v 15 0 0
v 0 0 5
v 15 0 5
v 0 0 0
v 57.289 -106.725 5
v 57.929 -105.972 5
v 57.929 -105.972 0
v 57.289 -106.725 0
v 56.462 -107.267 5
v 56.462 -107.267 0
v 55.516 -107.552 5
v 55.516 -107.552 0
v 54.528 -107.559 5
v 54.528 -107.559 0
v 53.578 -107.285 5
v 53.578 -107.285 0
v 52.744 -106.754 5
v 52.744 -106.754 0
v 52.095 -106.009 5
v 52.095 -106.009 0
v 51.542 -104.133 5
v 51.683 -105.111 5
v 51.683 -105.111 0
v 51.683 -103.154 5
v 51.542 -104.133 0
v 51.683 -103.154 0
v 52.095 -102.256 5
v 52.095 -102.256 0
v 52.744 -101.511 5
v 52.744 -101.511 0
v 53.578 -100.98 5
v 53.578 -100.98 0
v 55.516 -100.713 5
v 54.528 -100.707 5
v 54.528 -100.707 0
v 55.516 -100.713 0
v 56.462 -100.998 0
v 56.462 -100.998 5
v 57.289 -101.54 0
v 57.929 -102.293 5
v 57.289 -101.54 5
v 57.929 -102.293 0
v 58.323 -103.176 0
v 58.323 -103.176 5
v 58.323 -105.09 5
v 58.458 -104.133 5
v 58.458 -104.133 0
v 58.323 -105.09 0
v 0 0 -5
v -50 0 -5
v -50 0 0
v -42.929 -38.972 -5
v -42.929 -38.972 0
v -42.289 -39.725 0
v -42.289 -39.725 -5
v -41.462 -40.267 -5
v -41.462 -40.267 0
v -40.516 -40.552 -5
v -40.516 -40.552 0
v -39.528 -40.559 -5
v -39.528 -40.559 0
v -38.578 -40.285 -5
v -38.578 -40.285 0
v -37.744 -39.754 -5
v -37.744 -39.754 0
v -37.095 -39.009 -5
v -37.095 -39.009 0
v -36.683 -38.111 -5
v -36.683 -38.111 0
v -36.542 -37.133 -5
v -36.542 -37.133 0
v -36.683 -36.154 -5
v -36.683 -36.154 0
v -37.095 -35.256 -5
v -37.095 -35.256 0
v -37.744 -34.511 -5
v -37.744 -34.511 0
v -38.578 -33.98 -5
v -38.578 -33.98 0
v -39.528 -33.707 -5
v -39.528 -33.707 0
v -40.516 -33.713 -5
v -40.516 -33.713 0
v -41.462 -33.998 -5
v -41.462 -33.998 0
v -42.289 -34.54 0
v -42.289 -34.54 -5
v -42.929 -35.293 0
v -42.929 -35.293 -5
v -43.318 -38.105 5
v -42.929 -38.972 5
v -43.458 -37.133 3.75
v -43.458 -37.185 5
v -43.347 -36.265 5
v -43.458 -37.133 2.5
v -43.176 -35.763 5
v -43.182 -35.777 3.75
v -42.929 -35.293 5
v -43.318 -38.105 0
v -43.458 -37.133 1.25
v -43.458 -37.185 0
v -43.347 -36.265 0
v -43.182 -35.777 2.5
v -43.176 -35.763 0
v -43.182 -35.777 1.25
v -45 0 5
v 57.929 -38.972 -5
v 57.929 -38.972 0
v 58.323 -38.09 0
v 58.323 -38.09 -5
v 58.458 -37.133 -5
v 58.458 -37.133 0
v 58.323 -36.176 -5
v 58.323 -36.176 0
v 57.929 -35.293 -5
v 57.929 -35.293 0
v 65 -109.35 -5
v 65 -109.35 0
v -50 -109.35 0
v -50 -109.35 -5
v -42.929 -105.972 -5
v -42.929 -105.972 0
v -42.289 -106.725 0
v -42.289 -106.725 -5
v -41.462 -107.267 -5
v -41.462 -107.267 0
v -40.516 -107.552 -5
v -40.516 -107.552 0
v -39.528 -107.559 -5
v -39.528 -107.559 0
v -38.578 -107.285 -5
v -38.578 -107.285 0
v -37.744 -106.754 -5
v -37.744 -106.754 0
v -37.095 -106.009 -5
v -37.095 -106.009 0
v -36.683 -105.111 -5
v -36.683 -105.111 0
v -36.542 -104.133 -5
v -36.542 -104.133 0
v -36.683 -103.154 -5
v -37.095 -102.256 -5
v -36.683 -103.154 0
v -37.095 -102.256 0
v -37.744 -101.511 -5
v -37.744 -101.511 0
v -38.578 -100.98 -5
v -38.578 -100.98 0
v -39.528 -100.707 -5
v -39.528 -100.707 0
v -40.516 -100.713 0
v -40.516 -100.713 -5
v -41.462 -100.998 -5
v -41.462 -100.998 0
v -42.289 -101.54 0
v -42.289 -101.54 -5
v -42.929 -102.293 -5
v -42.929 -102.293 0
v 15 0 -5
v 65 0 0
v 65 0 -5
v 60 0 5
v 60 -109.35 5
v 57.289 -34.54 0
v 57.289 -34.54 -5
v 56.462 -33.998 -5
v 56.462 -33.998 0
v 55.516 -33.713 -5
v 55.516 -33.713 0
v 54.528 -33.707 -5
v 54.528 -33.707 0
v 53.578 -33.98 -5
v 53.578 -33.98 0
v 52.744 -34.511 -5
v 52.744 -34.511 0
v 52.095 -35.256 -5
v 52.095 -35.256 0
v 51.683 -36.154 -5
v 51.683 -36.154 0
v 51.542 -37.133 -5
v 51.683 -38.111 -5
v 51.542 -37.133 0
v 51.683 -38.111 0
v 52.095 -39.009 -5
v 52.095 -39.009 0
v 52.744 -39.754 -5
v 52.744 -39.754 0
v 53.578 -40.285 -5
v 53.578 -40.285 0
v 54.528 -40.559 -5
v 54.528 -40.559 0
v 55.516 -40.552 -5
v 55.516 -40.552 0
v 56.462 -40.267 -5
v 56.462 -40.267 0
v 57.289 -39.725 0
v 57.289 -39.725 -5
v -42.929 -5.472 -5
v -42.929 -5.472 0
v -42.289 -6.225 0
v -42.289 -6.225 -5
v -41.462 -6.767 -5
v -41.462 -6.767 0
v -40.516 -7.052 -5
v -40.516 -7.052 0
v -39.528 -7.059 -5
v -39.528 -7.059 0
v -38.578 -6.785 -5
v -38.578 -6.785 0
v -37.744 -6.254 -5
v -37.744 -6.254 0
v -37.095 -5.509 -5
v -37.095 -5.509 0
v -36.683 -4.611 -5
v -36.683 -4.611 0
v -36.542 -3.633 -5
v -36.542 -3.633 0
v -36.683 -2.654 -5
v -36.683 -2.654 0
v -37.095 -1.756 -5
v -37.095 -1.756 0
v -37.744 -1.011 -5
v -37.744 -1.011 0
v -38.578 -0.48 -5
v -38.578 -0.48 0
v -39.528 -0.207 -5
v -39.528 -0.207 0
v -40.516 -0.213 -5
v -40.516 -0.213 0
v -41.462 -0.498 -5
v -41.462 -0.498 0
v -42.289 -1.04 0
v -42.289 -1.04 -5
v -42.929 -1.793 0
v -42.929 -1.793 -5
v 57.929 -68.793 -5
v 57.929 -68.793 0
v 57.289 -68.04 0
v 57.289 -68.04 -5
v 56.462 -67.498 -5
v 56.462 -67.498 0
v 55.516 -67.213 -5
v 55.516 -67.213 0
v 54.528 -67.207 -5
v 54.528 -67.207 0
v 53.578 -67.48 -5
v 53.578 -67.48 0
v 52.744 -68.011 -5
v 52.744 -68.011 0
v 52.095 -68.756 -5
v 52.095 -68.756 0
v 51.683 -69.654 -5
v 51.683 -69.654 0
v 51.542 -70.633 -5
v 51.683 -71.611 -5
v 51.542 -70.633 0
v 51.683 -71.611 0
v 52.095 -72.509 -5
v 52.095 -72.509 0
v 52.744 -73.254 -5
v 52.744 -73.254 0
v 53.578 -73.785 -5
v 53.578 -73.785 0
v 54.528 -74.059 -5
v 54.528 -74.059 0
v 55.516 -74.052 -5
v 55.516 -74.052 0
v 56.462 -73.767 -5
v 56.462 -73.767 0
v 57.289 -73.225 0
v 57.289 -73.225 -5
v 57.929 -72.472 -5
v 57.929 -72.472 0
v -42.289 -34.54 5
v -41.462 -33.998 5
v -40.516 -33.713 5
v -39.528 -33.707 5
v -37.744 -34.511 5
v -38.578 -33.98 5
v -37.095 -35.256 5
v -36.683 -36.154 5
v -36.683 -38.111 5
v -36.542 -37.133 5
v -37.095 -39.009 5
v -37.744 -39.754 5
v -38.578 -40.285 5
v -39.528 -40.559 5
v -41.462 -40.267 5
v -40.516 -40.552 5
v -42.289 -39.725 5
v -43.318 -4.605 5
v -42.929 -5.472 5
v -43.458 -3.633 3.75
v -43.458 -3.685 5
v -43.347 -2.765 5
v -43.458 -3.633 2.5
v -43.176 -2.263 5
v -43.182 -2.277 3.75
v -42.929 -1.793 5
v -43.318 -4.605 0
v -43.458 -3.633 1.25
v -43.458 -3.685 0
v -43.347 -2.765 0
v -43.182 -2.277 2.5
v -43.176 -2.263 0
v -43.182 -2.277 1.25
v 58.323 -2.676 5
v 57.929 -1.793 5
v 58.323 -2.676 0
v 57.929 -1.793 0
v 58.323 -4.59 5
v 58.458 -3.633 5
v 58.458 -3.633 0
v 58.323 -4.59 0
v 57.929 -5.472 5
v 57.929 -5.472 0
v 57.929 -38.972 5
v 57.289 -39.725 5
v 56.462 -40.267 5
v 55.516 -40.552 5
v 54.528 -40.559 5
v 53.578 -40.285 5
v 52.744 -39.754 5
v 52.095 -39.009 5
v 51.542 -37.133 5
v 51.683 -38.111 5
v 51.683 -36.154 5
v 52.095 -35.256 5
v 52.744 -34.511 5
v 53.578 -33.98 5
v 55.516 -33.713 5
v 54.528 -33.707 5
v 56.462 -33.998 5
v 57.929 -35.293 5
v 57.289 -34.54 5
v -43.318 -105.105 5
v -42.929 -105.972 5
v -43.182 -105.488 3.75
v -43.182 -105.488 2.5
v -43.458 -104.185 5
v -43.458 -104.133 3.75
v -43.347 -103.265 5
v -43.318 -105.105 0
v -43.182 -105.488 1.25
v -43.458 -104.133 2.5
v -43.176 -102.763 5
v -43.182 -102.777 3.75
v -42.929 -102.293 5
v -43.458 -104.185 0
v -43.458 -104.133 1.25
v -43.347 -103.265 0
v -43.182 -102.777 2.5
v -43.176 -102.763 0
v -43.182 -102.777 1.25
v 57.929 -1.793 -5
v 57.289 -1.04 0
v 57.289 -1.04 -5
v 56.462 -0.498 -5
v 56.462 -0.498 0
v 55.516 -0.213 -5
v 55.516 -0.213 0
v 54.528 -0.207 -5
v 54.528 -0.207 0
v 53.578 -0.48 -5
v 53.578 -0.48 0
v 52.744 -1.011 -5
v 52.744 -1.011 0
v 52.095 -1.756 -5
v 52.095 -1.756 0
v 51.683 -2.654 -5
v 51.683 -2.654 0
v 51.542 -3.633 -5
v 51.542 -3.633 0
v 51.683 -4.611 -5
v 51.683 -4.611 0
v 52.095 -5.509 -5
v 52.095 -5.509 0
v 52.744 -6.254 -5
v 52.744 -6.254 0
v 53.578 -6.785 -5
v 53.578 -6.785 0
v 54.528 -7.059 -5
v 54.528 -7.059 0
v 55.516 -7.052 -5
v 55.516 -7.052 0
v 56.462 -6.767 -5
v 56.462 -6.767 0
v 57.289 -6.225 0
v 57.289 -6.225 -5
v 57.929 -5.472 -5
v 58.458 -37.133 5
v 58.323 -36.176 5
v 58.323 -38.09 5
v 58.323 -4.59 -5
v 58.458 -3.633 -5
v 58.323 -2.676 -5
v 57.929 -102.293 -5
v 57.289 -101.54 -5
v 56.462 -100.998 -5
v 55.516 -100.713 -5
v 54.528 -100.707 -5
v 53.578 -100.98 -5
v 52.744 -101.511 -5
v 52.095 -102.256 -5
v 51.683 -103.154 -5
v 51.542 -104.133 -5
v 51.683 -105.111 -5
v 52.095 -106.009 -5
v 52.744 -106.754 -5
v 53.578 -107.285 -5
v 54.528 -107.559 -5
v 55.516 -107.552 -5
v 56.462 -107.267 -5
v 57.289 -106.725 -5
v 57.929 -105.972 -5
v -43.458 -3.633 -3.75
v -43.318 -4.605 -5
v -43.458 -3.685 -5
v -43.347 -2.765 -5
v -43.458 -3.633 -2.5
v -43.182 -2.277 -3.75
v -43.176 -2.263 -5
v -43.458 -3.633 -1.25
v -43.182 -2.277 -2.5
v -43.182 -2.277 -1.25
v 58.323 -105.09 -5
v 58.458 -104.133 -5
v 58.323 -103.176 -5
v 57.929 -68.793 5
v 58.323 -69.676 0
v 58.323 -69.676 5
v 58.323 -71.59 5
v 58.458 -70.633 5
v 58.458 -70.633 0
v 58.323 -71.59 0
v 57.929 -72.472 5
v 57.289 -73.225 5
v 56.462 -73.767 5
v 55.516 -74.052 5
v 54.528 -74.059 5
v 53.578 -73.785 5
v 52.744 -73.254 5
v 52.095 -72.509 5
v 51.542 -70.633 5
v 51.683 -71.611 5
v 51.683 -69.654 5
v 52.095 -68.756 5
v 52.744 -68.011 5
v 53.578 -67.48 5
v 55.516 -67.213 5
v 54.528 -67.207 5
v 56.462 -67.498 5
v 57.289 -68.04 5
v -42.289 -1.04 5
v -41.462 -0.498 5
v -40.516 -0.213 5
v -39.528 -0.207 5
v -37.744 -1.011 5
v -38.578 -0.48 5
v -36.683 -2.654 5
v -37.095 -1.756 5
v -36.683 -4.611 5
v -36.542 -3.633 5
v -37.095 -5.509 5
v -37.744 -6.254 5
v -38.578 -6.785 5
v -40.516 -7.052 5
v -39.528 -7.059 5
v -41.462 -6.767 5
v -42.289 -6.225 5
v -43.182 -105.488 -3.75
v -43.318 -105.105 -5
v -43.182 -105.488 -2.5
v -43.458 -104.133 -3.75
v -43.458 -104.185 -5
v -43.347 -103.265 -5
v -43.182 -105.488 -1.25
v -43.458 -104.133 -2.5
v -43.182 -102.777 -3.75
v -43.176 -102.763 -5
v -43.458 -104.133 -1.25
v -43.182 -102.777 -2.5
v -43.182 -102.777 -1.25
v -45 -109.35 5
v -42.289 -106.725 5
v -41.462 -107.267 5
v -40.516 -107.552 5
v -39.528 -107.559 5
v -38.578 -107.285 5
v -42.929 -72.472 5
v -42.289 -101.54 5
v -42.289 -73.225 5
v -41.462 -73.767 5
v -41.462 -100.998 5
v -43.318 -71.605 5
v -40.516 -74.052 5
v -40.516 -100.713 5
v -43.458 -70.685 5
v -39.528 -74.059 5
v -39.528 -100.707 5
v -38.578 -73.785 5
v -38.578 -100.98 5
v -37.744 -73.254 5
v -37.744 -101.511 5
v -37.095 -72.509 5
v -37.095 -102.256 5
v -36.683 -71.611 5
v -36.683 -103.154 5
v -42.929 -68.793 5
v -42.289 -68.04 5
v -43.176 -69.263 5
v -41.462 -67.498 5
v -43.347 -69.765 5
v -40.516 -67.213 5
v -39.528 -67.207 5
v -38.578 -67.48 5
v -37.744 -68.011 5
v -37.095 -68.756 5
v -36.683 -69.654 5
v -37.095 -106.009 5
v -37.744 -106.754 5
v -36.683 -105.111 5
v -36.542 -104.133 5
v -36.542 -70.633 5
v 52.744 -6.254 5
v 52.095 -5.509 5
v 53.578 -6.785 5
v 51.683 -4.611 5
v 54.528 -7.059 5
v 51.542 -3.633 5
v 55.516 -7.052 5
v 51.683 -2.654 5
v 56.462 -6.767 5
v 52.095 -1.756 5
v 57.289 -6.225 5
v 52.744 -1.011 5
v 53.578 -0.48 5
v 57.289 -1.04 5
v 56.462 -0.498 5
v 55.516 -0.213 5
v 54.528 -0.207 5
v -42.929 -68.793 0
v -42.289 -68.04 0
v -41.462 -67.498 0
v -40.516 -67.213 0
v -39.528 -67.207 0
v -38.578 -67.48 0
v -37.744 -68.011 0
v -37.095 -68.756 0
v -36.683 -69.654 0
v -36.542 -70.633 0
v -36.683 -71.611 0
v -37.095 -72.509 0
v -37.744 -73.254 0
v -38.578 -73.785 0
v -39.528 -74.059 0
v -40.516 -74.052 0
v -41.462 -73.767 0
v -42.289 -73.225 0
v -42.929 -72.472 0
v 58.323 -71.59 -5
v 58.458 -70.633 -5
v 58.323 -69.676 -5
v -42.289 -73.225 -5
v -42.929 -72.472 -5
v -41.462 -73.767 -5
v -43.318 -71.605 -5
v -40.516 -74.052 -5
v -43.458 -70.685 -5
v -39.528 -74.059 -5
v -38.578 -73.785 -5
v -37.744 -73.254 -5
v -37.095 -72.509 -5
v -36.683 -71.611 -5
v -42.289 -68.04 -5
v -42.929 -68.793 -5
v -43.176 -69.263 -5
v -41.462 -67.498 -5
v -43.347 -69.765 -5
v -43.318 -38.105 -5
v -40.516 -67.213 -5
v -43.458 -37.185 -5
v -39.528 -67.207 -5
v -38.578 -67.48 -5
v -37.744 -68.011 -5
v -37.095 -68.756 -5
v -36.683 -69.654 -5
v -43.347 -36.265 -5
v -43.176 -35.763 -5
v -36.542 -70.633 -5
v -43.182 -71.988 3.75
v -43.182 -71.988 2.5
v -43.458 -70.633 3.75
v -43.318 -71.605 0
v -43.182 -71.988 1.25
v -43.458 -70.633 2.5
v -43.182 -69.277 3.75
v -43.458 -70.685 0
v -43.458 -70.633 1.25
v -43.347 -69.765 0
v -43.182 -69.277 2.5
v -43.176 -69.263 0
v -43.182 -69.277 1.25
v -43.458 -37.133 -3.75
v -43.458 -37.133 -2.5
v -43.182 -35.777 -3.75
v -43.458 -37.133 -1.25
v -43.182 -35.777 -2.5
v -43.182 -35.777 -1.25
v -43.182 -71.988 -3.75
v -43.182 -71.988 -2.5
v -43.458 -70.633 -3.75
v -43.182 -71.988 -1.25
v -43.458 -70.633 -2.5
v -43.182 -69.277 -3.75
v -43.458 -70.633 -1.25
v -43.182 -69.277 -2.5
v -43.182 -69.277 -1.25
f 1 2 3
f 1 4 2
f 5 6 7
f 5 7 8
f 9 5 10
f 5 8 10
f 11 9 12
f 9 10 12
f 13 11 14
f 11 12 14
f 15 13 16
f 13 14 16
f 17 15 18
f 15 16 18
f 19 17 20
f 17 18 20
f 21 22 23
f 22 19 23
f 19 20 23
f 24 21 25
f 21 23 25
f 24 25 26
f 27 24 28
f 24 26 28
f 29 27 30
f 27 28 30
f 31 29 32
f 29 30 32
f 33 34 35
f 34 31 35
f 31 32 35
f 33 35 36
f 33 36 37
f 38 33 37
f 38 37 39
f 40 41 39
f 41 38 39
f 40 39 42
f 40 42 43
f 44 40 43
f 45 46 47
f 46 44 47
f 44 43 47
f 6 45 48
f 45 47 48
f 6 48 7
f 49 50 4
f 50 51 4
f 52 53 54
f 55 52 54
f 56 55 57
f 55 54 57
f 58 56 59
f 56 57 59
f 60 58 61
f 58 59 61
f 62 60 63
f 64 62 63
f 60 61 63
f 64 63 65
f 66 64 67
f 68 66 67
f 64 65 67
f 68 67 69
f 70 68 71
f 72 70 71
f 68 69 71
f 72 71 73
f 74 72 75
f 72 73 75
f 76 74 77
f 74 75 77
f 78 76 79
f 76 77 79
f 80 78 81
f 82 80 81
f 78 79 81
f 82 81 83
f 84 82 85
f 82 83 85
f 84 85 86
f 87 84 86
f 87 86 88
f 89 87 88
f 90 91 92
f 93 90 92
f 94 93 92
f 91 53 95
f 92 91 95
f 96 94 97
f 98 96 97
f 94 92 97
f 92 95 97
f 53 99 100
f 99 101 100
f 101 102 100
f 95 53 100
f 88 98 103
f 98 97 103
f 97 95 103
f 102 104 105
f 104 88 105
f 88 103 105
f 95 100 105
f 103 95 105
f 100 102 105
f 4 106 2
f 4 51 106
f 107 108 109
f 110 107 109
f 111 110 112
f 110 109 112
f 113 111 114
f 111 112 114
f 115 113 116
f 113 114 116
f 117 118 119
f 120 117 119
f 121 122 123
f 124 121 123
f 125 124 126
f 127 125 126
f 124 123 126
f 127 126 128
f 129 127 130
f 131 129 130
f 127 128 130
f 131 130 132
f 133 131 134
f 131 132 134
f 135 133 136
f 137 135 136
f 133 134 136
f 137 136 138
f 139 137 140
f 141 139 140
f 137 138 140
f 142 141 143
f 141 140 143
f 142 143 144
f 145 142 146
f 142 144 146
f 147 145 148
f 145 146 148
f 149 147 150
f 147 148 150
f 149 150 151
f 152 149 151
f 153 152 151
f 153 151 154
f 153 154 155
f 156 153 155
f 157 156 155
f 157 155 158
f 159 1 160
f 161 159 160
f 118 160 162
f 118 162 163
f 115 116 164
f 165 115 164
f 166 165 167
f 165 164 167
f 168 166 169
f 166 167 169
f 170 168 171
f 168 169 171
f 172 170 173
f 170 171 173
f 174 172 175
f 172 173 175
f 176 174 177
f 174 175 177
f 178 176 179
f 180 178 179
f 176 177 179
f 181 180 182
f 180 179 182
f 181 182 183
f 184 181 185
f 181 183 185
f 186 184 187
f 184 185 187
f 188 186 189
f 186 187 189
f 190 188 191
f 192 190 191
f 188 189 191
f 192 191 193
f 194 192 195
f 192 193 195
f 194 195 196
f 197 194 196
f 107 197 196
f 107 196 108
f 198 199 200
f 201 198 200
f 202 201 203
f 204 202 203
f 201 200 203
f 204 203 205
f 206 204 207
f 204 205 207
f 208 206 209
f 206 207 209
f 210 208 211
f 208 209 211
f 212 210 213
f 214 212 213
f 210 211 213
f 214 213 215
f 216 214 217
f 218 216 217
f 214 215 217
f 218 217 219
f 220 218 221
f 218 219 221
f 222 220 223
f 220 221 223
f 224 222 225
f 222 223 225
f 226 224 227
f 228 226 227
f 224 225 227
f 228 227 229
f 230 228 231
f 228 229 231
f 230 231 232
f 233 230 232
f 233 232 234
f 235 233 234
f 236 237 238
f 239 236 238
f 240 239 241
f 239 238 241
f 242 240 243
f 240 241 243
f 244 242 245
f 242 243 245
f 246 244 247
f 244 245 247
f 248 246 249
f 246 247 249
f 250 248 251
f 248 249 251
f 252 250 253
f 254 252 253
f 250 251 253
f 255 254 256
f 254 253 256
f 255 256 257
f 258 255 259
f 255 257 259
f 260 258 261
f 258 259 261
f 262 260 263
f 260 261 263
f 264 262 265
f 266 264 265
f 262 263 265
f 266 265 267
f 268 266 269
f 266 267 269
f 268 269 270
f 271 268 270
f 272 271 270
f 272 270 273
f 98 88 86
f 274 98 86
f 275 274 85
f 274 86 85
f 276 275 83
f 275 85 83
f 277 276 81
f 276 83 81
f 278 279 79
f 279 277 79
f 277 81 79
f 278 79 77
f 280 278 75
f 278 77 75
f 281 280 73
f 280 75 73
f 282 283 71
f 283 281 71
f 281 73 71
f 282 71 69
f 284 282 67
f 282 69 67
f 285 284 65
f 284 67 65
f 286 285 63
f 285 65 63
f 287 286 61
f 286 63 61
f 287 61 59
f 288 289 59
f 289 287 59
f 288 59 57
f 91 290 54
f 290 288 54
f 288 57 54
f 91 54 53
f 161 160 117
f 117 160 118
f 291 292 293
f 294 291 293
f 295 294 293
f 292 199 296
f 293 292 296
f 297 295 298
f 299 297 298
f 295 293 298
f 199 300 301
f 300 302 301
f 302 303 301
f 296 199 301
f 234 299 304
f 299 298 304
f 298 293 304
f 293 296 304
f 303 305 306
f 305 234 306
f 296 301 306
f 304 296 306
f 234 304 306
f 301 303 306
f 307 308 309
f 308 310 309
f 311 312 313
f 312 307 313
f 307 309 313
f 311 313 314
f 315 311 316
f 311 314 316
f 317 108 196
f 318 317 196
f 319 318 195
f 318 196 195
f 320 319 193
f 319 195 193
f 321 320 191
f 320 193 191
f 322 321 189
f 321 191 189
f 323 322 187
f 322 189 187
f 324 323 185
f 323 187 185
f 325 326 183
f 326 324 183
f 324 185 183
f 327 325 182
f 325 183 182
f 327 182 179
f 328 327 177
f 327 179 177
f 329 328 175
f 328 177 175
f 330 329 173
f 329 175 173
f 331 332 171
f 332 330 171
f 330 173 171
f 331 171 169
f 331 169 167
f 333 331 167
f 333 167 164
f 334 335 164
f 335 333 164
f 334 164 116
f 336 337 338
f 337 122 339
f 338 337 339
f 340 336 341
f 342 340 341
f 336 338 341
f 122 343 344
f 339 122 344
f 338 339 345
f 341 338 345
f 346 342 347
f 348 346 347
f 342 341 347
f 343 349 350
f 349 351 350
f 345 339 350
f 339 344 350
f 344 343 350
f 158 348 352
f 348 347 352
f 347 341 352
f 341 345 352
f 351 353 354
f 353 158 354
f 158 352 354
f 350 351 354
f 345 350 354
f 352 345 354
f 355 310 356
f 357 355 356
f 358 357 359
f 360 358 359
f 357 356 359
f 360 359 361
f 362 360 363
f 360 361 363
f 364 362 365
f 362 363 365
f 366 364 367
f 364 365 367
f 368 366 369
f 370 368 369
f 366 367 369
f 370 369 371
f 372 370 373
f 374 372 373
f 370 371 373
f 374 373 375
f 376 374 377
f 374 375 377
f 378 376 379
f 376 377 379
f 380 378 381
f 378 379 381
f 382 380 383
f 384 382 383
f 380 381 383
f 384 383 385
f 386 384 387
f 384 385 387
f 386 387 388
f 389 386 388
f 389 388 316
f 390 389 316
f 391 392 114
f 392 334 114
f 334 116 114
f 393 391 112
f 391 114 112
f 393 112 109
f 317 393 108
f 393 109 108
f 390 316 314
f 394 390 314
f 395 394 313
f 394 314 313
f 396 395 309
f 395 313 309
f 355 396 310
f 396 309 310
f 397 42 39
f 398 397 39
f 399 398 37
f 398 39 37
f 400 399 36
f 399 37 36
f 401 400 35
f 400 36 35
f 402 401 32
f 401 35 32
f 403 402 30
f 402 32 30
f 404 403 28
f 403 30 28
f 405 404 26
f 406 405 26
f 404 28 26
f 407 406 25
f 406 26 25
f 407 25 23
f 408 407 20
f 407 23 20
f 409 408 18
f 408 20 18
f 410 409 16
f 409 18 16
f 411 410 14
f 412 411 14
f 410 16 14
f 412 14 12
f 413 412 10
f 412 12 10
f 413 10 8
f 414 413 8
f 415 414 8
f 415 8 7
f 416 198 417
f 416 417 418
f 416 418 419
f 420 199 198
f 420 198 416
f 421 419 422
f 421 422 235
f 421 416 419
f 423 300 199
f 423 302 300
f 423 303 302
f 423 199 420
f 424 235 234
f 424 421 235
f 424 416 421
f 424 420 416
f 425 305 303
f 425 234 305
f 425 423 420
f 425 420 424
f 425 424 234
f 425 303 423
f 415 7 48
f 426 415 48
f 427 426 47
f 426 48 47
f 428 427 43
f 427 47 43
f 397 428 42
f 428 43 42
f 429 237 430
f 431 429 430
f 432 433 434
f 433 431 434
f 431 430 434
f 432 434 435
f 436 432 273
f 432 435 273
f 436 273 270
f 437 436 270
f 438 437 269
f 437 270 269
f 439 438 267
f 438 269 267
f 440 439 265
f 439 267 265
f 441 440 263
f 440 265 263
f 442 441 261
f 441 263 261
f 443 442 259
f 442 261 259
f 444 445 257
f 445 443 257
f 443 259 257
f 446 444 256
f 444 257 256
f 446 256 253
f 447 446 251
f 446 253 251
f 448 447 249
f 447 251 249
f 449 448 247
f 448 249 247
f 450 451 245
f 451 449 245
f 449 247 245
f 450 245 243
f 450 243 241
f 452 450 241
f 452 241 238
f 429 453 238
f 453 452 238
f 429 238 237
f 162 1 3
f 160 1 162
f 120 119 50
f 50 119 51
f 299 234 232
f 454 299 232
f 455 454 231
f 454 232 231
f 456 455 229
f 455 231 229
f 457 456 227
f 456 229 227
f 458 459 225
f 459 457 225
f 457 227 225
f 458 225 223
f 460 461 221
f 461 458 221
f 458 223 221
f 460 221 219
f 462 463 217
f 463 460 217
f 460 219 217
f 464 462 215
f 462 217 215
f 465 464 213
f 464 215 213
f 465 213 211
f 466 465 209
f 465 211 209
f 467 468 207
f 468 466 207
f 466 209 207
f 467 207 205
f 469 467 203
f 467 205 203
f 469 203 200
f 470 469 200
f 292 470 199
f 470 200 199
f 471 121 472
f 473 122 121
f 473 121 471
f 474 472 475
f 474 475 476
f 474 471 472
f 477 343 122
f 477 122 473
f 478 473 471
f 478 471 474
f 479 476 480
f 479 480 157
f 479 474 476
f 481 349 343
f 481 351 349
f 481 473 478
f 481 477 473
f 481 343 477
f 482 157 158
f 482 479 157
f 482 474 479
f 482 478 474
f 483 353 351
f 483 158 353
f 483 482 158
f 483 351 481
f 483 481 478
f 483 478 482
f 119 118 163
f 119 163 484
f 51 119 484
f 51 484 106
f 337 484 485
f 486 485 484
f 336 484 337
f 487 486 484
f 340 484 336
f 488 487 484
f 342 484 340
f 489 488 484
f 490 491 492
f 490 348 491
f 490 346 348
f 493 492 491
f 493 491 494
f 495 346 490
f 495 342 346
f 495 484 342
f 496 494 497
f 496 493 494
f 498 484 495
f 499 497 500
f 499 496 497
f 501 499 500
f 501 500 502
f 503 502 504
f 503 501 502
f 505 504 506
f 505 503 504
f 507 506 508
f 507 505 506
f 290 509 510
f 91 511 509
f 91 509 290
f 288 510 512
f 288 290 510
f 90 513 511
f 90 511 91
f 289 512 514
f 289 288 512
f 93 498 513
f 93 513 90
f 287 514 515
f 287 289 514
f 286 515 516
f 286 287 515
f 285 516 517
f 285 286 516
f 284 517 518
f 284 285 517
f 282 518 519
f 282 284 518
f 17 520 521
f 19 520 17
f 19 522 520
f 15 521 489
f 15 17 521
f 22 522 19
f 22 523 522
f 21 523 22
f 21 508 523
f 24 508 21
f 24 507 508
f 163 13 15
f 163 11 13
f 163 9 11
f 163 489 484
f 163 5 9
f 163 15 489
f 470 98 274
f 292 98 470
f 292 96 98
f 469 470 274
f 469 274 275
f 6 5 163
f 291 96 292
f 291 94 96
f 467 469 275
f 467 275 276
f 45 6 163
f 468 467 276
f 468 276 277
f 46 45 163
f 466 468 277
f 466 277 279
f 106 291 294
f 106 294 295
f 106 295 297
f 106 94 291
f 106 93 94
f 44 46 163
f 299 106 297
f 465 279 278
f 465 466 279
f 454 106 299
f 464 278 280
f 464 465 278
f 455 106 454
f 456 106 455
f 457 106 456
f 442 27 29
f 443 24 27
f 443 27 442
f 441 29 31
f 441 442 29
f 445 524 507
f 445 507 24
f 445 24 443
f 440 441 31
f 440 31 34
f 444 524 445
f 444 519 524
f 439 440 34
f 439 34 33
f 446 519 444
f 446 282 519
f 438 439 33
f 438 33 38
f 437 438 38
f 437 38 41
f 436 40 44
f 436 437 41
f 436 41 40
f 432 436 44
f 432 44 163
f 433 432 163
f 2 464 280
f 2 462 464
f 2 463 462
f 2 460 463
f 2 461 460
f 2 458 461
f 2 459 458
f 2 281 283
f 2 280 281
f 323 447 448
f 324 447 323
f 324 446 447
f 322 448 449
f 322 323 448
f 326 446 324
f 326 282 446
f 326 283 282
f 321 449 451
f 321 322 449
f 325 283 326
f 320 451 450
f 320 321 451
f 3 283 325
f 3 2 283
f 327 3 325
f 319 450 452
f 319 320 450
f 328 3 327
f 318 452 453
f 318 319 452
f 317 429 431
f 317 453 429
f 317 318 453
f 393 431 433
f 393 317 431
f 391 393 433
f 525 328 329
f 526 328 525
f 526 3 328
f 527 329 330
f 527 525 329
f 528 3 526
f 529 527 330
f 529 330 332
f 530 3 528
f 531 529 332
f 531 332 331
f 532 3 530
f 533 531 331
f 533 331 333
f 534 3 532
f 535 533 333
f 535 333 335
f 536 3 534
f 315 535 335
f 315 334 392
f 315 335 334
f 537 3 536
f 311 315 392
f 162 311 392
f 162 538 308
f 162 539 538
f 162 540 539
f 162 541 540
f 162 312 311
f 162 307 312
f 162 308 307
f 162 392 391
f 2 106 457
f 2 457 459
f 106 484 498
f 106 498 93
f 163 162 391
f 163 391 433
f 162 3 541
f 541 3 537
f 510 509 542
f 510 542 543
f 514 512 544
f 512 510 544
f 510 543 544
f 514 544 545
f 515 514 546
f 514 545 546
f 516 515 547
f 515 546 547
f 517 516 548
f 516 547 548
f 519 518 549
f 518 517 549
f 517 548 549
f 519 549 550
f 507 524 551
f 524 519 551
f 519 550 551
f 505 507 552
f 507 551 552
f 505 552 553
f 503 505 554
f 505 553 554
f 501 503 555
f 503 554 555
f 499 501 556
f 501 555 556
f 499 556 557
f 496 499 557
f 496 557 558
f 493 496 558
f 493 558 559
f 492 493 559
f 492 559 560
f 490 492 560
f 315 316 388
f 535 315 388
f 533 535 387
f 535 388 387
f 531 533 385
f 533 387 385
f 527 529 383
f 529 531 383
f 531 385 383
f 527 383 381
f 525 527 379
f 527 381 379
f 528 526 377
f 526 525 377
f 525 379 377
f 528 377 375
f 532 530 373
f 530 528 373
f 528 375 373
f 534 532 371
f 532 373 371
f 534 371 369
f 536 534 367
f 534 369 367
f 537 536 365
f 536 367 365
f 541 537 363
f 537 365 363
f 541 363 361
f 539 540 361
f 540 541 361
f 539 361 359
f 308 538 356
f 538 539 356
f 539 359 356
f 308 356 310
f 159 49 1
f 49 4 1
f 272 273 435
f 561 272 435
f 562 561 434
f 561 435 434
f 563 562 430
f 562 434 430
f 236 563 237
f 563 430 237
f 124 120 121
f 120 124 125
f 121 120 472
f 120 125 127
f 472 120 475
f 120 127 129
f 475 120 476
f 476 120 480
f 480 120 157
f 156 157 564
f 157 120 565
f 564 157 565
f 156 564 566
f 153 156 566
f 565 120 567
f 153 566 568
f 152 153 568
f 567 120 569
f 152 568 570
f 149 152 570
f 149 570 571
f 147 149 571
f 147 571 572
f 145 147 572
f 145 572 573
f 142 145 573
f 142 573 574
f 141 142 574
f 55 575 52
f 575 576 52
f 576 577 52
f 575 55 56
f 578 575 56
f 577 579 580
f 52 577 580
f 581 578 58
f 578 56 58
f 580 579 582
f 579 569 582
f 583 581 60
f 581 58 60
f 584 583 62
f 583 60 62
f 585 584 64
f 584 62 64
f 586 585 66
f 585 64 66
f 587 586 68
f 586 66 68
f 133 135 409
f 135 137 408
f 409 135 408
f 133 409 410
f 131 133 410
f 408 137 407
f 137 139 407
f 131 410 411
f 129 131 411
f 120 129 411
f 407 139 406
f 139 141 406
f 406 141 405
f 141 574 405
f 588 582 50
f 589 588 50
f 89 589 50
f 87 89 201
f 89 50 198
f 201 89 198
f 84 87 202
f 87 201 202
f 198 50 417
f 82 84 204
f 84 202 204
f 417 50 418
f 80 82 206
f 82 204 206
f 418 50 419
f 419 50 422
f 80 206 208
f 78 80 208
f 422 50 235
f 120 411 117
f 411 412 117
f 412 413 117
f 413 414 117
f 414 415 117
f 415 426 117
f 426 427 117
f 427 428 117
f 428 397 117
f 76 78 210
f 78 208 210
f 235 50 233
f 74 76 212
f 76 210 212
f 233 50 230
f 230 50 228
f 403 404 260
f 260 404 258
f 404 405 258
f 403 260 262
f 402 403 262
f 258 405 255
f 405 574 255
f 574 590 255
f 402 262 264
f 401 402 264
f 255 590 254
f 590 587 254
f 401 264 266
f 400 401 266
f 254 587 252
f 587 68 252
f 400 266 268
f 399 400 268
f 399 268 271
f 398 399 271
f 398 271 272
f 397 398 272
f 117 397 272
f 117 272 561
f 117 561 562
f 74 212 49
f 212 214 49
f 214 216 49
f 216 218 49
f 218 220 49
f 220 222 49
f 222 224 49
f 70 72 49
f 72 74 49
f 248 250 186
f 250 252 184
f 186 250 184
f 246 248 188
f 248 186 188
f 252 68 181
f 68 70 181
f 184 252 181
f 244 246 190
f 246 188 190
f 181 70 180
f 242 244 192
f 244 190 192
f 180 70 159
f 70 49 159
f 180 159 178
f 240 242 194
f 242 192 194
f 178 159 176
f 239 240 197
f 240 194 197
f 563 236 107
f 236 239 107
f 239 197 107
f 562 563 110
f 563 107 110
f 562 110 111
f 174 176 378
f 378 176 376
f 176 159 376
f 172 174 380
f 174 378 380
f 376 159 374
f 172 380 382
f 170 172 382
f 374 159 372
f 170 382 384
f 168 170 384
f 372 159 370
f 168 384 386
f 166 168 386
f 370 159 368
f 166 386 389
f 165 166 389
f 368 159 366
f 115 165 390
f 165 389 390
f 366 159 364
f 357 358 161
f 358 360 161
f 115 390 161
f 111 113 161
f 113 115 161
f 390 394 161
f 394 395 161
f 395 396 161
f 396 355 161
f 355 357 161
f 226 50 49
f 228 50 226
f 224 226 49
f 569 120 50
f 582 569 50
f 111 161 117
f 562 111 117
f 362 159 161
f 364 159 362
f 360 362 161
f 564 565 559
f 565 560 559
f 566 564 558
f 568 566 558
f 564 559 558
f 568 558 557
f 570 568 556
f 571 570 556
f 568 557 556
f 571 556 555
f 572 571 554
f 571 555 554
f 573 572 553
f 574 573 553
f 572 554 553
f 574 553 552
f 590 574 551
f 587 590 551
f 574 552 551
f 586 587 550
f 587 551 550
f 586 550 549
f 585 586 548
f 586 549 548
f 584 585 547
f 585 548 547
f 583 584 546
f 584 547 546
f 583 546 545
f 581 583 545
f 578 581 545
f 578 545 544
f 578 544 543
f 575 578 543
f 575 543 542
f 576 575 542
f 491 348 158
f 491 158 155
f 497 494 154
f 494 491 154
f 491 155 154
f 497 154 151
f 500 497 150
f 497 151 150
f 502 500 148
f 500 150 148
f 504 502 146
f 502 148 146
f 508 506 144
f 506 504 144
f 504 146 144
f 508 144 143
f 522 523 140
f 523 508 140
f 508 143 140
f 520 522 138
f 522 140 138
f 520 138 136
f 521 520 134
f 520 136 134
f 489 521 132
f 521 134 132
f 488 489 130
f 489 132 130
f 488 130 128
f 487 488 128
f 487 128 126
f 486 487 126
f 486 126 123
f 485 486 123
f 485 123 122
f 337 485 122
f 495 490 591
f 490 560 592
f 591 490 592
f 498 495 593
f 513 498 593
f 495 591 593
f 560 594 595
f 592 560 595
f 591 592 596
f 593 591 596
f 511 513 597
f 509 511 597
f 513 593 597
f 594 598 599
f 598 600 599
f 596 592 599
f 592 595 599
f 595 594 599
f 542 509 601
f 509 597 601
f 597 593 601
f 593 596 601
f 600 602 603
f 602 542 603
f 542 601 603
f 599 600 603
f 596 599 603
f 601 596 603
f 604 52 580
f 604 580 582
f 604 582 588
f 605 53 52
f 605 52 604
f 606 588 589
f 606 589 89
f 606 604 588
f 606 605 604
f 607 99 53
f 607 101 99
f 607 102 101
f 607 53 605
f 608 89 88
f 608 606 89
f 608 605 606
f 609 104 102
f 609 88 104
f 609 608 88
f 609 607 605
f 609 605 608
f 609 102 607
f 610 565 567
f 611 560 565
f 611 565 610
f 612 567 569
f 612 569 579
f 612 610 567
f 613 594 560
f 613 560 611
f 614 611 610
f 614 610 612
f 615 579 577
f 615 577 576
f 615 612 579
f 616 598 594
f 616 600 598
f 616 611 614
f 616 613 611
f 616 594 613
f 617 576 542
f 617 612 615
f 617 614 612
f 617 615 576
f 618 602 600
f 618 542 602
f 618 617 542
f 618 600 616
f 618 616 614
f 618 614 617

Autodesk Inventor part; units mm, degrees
ref_plane "YZ Plane" through (0, 0, 0) normal (1, 0, 0) x (0, 1, 0)
ref_plane "XZ Plane" through (0, 0, 0) normal (0, 1, 0) x (-1, 0, 0)
ref_plane "XY Plane" through (0, 0, 0) normal (0, 0, 1) x (1, 0, 0)
sketch "Sketch1" plane through (0, 0, 0) normal (0, 0, 1) x (1, 0, 0)
  line L0 (0, 0) -> (15, 0)
  arc A0 (-42.9289, -5.4718) -> (-42.9289, -1.7934) centre (-40, -3.6326) ccw
  arc A1 (-42.9289, -38.9718) -> (-42.9289, -35.2934) centre (-40, -37.1326) ccw
  arc A2 (-42.9289, -72.4718) -> (-42.9289, -68.7934) centre (-40, -70.6326) ccw
  arc A3 (-42.9289, -105.9718) -> (-42.9289, -102.2934) centre (-40, -104.1326) ccw
  arc A4 (57.9289, -102.2934) -> (57.9289, -105.9718) centre (55, -104.1326) ccw
  arc A5 (57.9289, -68.7934) -> (57.9289, -72.4718) centre (55, -70.6326) ccw
  arc A6 (57.9289, -35.2934) -> (57.9289, -38.9718) centre (55, -37.1326) ccw
  arc A7 (57.9289, -1.7934) -> (57.9289, -5.4718) centre (55, -3.6326) ccw
  line L1 (0, 0) -> (15, 0)
  spline S0 degree 3 poles (-42.9289, -5.4718) (-43.0252, -5.3184) (-43.1102, -5.1562) (-43.3669, -4.5537) (-43.4585, -4.079) (-43.4585, -3.1862) (-43.3669, -2.7114) (-43.1102, -2.109) (-43.0252, -1.9468) (-42.9289, -1.7934) knots 1.816211 1.816211 1.816211 1.816211 1.867954 1.867954 2.001868 2.001868 2.135782 2.135782 2.187525 2.187525 2.187525 2.187525
  spline S1 degree 3 poles (-42.9289, -105.9718) (-43.0252, -105.8184) (-43.1102, -105.6562) (-43.3669, -105.0537) (-43.4585, -104.579) (-43.4585, -103.6862) (-43.3669, -103.2114) (-43.1102, -102.609) (-43.0252, -102.4468) (-42.9289, -102.2934) knots 1.816211 1.816211 1.816211 1.816211 1.867954 1.867954 2.001868 2.001868 2.135782 2.135782 2.187525 2.187525 2.187525 2.187525
  spline S2 degree 3 poles (-42.9289, -72.4718) (-43.0252, -72.3184) (-43.1102, -72.1562) (-43.3669, -71.5537) (-43.4585, -71.079) (-43.4585, -70.1862) (-43.3669, -69.7114) (-43.1102, -69.109) (-43.0252, -68.9468) (-42.9289, -68.7934) knots 1.816211 1.816211 1.816211 1.816211 1.867954 1.867954 2.001868 2.001868 2.135782 2.135782 2.187525 2.187525 2.187525 2.187525
  spline S3 degree 3 poles (-42.9289, -38.9718) (-43.0252, -38.8184) (-43.1102, -38.6562) (-43.3669, -38.0537) (-43.4585, -37.579) (-43.4585, -36.6862) (-43.3669, -36.2114) (-43.1102, -35.609) (-43.0252, -35.4468) (-42.9289, -35.2934) knots 1.816211 1.816211 1.816211 1.816211 1.867954 1.867954 2.001868 2.001868 2.135782 2.135782 2.187525 2.187525 2.187525 2.187525
  arc A8 (57.9289, -38.9718) -> (57.9289, -35.2934) centre (55, -37.1326) ccw
  arc A9 (57.9289, -5.4718) -> (57.9289, -1.7934) centre (55, -3.6326) ccw
  arc A10 (57.9289, -72.4718) -> (57.9289, -68.7934) centre (55, -70.6326) ccw
  arc A11 (57.9289, -105.9718) -> (57.9289, -102.2934) centre (55, -104.1326) ccw
  line L2 (-50, 0.0004) -> (65, 0.0004)
  line L3 (65, 0.0004) -> (65, -109.3496)
  line L4 (65, -109.3496) -> (-50, -109.3496)
  line L5 (-50, -109.3496) -> (-50, 0.0004)
  point P0 (7.5, -111.1326)
  point P1 (84.0033, -110.1193)
  point P2 (84.0033, -111.5873)
  point P3 (-42.9289, -102.2934)
  point P4 (84.0033, -151.6974)
  point P5 (84.0033, -136.8593)
  point P6 (84.0033, -138.3274)
  point P7 (84.0033, -123.4893)
  point P8 (84.0033, -124.9573)
  point P9 (7.5, -109.3496)
  point P10 (-42.9289, -35.2934)
  dimension "d8" = 115
  dimension "d9" = 109.35
  dimension "d10" = 3.633
extrude "Extrusion1" add sketch "Sketch1" along normal mid plane 10
chamfer "Chamfer1" distance 5 angle 45 2 edges at (-50, -54.6746, 5) (65, -54.6746, 5)
properties part number "Upper cover of robot head" material "Steel, Alloy"
